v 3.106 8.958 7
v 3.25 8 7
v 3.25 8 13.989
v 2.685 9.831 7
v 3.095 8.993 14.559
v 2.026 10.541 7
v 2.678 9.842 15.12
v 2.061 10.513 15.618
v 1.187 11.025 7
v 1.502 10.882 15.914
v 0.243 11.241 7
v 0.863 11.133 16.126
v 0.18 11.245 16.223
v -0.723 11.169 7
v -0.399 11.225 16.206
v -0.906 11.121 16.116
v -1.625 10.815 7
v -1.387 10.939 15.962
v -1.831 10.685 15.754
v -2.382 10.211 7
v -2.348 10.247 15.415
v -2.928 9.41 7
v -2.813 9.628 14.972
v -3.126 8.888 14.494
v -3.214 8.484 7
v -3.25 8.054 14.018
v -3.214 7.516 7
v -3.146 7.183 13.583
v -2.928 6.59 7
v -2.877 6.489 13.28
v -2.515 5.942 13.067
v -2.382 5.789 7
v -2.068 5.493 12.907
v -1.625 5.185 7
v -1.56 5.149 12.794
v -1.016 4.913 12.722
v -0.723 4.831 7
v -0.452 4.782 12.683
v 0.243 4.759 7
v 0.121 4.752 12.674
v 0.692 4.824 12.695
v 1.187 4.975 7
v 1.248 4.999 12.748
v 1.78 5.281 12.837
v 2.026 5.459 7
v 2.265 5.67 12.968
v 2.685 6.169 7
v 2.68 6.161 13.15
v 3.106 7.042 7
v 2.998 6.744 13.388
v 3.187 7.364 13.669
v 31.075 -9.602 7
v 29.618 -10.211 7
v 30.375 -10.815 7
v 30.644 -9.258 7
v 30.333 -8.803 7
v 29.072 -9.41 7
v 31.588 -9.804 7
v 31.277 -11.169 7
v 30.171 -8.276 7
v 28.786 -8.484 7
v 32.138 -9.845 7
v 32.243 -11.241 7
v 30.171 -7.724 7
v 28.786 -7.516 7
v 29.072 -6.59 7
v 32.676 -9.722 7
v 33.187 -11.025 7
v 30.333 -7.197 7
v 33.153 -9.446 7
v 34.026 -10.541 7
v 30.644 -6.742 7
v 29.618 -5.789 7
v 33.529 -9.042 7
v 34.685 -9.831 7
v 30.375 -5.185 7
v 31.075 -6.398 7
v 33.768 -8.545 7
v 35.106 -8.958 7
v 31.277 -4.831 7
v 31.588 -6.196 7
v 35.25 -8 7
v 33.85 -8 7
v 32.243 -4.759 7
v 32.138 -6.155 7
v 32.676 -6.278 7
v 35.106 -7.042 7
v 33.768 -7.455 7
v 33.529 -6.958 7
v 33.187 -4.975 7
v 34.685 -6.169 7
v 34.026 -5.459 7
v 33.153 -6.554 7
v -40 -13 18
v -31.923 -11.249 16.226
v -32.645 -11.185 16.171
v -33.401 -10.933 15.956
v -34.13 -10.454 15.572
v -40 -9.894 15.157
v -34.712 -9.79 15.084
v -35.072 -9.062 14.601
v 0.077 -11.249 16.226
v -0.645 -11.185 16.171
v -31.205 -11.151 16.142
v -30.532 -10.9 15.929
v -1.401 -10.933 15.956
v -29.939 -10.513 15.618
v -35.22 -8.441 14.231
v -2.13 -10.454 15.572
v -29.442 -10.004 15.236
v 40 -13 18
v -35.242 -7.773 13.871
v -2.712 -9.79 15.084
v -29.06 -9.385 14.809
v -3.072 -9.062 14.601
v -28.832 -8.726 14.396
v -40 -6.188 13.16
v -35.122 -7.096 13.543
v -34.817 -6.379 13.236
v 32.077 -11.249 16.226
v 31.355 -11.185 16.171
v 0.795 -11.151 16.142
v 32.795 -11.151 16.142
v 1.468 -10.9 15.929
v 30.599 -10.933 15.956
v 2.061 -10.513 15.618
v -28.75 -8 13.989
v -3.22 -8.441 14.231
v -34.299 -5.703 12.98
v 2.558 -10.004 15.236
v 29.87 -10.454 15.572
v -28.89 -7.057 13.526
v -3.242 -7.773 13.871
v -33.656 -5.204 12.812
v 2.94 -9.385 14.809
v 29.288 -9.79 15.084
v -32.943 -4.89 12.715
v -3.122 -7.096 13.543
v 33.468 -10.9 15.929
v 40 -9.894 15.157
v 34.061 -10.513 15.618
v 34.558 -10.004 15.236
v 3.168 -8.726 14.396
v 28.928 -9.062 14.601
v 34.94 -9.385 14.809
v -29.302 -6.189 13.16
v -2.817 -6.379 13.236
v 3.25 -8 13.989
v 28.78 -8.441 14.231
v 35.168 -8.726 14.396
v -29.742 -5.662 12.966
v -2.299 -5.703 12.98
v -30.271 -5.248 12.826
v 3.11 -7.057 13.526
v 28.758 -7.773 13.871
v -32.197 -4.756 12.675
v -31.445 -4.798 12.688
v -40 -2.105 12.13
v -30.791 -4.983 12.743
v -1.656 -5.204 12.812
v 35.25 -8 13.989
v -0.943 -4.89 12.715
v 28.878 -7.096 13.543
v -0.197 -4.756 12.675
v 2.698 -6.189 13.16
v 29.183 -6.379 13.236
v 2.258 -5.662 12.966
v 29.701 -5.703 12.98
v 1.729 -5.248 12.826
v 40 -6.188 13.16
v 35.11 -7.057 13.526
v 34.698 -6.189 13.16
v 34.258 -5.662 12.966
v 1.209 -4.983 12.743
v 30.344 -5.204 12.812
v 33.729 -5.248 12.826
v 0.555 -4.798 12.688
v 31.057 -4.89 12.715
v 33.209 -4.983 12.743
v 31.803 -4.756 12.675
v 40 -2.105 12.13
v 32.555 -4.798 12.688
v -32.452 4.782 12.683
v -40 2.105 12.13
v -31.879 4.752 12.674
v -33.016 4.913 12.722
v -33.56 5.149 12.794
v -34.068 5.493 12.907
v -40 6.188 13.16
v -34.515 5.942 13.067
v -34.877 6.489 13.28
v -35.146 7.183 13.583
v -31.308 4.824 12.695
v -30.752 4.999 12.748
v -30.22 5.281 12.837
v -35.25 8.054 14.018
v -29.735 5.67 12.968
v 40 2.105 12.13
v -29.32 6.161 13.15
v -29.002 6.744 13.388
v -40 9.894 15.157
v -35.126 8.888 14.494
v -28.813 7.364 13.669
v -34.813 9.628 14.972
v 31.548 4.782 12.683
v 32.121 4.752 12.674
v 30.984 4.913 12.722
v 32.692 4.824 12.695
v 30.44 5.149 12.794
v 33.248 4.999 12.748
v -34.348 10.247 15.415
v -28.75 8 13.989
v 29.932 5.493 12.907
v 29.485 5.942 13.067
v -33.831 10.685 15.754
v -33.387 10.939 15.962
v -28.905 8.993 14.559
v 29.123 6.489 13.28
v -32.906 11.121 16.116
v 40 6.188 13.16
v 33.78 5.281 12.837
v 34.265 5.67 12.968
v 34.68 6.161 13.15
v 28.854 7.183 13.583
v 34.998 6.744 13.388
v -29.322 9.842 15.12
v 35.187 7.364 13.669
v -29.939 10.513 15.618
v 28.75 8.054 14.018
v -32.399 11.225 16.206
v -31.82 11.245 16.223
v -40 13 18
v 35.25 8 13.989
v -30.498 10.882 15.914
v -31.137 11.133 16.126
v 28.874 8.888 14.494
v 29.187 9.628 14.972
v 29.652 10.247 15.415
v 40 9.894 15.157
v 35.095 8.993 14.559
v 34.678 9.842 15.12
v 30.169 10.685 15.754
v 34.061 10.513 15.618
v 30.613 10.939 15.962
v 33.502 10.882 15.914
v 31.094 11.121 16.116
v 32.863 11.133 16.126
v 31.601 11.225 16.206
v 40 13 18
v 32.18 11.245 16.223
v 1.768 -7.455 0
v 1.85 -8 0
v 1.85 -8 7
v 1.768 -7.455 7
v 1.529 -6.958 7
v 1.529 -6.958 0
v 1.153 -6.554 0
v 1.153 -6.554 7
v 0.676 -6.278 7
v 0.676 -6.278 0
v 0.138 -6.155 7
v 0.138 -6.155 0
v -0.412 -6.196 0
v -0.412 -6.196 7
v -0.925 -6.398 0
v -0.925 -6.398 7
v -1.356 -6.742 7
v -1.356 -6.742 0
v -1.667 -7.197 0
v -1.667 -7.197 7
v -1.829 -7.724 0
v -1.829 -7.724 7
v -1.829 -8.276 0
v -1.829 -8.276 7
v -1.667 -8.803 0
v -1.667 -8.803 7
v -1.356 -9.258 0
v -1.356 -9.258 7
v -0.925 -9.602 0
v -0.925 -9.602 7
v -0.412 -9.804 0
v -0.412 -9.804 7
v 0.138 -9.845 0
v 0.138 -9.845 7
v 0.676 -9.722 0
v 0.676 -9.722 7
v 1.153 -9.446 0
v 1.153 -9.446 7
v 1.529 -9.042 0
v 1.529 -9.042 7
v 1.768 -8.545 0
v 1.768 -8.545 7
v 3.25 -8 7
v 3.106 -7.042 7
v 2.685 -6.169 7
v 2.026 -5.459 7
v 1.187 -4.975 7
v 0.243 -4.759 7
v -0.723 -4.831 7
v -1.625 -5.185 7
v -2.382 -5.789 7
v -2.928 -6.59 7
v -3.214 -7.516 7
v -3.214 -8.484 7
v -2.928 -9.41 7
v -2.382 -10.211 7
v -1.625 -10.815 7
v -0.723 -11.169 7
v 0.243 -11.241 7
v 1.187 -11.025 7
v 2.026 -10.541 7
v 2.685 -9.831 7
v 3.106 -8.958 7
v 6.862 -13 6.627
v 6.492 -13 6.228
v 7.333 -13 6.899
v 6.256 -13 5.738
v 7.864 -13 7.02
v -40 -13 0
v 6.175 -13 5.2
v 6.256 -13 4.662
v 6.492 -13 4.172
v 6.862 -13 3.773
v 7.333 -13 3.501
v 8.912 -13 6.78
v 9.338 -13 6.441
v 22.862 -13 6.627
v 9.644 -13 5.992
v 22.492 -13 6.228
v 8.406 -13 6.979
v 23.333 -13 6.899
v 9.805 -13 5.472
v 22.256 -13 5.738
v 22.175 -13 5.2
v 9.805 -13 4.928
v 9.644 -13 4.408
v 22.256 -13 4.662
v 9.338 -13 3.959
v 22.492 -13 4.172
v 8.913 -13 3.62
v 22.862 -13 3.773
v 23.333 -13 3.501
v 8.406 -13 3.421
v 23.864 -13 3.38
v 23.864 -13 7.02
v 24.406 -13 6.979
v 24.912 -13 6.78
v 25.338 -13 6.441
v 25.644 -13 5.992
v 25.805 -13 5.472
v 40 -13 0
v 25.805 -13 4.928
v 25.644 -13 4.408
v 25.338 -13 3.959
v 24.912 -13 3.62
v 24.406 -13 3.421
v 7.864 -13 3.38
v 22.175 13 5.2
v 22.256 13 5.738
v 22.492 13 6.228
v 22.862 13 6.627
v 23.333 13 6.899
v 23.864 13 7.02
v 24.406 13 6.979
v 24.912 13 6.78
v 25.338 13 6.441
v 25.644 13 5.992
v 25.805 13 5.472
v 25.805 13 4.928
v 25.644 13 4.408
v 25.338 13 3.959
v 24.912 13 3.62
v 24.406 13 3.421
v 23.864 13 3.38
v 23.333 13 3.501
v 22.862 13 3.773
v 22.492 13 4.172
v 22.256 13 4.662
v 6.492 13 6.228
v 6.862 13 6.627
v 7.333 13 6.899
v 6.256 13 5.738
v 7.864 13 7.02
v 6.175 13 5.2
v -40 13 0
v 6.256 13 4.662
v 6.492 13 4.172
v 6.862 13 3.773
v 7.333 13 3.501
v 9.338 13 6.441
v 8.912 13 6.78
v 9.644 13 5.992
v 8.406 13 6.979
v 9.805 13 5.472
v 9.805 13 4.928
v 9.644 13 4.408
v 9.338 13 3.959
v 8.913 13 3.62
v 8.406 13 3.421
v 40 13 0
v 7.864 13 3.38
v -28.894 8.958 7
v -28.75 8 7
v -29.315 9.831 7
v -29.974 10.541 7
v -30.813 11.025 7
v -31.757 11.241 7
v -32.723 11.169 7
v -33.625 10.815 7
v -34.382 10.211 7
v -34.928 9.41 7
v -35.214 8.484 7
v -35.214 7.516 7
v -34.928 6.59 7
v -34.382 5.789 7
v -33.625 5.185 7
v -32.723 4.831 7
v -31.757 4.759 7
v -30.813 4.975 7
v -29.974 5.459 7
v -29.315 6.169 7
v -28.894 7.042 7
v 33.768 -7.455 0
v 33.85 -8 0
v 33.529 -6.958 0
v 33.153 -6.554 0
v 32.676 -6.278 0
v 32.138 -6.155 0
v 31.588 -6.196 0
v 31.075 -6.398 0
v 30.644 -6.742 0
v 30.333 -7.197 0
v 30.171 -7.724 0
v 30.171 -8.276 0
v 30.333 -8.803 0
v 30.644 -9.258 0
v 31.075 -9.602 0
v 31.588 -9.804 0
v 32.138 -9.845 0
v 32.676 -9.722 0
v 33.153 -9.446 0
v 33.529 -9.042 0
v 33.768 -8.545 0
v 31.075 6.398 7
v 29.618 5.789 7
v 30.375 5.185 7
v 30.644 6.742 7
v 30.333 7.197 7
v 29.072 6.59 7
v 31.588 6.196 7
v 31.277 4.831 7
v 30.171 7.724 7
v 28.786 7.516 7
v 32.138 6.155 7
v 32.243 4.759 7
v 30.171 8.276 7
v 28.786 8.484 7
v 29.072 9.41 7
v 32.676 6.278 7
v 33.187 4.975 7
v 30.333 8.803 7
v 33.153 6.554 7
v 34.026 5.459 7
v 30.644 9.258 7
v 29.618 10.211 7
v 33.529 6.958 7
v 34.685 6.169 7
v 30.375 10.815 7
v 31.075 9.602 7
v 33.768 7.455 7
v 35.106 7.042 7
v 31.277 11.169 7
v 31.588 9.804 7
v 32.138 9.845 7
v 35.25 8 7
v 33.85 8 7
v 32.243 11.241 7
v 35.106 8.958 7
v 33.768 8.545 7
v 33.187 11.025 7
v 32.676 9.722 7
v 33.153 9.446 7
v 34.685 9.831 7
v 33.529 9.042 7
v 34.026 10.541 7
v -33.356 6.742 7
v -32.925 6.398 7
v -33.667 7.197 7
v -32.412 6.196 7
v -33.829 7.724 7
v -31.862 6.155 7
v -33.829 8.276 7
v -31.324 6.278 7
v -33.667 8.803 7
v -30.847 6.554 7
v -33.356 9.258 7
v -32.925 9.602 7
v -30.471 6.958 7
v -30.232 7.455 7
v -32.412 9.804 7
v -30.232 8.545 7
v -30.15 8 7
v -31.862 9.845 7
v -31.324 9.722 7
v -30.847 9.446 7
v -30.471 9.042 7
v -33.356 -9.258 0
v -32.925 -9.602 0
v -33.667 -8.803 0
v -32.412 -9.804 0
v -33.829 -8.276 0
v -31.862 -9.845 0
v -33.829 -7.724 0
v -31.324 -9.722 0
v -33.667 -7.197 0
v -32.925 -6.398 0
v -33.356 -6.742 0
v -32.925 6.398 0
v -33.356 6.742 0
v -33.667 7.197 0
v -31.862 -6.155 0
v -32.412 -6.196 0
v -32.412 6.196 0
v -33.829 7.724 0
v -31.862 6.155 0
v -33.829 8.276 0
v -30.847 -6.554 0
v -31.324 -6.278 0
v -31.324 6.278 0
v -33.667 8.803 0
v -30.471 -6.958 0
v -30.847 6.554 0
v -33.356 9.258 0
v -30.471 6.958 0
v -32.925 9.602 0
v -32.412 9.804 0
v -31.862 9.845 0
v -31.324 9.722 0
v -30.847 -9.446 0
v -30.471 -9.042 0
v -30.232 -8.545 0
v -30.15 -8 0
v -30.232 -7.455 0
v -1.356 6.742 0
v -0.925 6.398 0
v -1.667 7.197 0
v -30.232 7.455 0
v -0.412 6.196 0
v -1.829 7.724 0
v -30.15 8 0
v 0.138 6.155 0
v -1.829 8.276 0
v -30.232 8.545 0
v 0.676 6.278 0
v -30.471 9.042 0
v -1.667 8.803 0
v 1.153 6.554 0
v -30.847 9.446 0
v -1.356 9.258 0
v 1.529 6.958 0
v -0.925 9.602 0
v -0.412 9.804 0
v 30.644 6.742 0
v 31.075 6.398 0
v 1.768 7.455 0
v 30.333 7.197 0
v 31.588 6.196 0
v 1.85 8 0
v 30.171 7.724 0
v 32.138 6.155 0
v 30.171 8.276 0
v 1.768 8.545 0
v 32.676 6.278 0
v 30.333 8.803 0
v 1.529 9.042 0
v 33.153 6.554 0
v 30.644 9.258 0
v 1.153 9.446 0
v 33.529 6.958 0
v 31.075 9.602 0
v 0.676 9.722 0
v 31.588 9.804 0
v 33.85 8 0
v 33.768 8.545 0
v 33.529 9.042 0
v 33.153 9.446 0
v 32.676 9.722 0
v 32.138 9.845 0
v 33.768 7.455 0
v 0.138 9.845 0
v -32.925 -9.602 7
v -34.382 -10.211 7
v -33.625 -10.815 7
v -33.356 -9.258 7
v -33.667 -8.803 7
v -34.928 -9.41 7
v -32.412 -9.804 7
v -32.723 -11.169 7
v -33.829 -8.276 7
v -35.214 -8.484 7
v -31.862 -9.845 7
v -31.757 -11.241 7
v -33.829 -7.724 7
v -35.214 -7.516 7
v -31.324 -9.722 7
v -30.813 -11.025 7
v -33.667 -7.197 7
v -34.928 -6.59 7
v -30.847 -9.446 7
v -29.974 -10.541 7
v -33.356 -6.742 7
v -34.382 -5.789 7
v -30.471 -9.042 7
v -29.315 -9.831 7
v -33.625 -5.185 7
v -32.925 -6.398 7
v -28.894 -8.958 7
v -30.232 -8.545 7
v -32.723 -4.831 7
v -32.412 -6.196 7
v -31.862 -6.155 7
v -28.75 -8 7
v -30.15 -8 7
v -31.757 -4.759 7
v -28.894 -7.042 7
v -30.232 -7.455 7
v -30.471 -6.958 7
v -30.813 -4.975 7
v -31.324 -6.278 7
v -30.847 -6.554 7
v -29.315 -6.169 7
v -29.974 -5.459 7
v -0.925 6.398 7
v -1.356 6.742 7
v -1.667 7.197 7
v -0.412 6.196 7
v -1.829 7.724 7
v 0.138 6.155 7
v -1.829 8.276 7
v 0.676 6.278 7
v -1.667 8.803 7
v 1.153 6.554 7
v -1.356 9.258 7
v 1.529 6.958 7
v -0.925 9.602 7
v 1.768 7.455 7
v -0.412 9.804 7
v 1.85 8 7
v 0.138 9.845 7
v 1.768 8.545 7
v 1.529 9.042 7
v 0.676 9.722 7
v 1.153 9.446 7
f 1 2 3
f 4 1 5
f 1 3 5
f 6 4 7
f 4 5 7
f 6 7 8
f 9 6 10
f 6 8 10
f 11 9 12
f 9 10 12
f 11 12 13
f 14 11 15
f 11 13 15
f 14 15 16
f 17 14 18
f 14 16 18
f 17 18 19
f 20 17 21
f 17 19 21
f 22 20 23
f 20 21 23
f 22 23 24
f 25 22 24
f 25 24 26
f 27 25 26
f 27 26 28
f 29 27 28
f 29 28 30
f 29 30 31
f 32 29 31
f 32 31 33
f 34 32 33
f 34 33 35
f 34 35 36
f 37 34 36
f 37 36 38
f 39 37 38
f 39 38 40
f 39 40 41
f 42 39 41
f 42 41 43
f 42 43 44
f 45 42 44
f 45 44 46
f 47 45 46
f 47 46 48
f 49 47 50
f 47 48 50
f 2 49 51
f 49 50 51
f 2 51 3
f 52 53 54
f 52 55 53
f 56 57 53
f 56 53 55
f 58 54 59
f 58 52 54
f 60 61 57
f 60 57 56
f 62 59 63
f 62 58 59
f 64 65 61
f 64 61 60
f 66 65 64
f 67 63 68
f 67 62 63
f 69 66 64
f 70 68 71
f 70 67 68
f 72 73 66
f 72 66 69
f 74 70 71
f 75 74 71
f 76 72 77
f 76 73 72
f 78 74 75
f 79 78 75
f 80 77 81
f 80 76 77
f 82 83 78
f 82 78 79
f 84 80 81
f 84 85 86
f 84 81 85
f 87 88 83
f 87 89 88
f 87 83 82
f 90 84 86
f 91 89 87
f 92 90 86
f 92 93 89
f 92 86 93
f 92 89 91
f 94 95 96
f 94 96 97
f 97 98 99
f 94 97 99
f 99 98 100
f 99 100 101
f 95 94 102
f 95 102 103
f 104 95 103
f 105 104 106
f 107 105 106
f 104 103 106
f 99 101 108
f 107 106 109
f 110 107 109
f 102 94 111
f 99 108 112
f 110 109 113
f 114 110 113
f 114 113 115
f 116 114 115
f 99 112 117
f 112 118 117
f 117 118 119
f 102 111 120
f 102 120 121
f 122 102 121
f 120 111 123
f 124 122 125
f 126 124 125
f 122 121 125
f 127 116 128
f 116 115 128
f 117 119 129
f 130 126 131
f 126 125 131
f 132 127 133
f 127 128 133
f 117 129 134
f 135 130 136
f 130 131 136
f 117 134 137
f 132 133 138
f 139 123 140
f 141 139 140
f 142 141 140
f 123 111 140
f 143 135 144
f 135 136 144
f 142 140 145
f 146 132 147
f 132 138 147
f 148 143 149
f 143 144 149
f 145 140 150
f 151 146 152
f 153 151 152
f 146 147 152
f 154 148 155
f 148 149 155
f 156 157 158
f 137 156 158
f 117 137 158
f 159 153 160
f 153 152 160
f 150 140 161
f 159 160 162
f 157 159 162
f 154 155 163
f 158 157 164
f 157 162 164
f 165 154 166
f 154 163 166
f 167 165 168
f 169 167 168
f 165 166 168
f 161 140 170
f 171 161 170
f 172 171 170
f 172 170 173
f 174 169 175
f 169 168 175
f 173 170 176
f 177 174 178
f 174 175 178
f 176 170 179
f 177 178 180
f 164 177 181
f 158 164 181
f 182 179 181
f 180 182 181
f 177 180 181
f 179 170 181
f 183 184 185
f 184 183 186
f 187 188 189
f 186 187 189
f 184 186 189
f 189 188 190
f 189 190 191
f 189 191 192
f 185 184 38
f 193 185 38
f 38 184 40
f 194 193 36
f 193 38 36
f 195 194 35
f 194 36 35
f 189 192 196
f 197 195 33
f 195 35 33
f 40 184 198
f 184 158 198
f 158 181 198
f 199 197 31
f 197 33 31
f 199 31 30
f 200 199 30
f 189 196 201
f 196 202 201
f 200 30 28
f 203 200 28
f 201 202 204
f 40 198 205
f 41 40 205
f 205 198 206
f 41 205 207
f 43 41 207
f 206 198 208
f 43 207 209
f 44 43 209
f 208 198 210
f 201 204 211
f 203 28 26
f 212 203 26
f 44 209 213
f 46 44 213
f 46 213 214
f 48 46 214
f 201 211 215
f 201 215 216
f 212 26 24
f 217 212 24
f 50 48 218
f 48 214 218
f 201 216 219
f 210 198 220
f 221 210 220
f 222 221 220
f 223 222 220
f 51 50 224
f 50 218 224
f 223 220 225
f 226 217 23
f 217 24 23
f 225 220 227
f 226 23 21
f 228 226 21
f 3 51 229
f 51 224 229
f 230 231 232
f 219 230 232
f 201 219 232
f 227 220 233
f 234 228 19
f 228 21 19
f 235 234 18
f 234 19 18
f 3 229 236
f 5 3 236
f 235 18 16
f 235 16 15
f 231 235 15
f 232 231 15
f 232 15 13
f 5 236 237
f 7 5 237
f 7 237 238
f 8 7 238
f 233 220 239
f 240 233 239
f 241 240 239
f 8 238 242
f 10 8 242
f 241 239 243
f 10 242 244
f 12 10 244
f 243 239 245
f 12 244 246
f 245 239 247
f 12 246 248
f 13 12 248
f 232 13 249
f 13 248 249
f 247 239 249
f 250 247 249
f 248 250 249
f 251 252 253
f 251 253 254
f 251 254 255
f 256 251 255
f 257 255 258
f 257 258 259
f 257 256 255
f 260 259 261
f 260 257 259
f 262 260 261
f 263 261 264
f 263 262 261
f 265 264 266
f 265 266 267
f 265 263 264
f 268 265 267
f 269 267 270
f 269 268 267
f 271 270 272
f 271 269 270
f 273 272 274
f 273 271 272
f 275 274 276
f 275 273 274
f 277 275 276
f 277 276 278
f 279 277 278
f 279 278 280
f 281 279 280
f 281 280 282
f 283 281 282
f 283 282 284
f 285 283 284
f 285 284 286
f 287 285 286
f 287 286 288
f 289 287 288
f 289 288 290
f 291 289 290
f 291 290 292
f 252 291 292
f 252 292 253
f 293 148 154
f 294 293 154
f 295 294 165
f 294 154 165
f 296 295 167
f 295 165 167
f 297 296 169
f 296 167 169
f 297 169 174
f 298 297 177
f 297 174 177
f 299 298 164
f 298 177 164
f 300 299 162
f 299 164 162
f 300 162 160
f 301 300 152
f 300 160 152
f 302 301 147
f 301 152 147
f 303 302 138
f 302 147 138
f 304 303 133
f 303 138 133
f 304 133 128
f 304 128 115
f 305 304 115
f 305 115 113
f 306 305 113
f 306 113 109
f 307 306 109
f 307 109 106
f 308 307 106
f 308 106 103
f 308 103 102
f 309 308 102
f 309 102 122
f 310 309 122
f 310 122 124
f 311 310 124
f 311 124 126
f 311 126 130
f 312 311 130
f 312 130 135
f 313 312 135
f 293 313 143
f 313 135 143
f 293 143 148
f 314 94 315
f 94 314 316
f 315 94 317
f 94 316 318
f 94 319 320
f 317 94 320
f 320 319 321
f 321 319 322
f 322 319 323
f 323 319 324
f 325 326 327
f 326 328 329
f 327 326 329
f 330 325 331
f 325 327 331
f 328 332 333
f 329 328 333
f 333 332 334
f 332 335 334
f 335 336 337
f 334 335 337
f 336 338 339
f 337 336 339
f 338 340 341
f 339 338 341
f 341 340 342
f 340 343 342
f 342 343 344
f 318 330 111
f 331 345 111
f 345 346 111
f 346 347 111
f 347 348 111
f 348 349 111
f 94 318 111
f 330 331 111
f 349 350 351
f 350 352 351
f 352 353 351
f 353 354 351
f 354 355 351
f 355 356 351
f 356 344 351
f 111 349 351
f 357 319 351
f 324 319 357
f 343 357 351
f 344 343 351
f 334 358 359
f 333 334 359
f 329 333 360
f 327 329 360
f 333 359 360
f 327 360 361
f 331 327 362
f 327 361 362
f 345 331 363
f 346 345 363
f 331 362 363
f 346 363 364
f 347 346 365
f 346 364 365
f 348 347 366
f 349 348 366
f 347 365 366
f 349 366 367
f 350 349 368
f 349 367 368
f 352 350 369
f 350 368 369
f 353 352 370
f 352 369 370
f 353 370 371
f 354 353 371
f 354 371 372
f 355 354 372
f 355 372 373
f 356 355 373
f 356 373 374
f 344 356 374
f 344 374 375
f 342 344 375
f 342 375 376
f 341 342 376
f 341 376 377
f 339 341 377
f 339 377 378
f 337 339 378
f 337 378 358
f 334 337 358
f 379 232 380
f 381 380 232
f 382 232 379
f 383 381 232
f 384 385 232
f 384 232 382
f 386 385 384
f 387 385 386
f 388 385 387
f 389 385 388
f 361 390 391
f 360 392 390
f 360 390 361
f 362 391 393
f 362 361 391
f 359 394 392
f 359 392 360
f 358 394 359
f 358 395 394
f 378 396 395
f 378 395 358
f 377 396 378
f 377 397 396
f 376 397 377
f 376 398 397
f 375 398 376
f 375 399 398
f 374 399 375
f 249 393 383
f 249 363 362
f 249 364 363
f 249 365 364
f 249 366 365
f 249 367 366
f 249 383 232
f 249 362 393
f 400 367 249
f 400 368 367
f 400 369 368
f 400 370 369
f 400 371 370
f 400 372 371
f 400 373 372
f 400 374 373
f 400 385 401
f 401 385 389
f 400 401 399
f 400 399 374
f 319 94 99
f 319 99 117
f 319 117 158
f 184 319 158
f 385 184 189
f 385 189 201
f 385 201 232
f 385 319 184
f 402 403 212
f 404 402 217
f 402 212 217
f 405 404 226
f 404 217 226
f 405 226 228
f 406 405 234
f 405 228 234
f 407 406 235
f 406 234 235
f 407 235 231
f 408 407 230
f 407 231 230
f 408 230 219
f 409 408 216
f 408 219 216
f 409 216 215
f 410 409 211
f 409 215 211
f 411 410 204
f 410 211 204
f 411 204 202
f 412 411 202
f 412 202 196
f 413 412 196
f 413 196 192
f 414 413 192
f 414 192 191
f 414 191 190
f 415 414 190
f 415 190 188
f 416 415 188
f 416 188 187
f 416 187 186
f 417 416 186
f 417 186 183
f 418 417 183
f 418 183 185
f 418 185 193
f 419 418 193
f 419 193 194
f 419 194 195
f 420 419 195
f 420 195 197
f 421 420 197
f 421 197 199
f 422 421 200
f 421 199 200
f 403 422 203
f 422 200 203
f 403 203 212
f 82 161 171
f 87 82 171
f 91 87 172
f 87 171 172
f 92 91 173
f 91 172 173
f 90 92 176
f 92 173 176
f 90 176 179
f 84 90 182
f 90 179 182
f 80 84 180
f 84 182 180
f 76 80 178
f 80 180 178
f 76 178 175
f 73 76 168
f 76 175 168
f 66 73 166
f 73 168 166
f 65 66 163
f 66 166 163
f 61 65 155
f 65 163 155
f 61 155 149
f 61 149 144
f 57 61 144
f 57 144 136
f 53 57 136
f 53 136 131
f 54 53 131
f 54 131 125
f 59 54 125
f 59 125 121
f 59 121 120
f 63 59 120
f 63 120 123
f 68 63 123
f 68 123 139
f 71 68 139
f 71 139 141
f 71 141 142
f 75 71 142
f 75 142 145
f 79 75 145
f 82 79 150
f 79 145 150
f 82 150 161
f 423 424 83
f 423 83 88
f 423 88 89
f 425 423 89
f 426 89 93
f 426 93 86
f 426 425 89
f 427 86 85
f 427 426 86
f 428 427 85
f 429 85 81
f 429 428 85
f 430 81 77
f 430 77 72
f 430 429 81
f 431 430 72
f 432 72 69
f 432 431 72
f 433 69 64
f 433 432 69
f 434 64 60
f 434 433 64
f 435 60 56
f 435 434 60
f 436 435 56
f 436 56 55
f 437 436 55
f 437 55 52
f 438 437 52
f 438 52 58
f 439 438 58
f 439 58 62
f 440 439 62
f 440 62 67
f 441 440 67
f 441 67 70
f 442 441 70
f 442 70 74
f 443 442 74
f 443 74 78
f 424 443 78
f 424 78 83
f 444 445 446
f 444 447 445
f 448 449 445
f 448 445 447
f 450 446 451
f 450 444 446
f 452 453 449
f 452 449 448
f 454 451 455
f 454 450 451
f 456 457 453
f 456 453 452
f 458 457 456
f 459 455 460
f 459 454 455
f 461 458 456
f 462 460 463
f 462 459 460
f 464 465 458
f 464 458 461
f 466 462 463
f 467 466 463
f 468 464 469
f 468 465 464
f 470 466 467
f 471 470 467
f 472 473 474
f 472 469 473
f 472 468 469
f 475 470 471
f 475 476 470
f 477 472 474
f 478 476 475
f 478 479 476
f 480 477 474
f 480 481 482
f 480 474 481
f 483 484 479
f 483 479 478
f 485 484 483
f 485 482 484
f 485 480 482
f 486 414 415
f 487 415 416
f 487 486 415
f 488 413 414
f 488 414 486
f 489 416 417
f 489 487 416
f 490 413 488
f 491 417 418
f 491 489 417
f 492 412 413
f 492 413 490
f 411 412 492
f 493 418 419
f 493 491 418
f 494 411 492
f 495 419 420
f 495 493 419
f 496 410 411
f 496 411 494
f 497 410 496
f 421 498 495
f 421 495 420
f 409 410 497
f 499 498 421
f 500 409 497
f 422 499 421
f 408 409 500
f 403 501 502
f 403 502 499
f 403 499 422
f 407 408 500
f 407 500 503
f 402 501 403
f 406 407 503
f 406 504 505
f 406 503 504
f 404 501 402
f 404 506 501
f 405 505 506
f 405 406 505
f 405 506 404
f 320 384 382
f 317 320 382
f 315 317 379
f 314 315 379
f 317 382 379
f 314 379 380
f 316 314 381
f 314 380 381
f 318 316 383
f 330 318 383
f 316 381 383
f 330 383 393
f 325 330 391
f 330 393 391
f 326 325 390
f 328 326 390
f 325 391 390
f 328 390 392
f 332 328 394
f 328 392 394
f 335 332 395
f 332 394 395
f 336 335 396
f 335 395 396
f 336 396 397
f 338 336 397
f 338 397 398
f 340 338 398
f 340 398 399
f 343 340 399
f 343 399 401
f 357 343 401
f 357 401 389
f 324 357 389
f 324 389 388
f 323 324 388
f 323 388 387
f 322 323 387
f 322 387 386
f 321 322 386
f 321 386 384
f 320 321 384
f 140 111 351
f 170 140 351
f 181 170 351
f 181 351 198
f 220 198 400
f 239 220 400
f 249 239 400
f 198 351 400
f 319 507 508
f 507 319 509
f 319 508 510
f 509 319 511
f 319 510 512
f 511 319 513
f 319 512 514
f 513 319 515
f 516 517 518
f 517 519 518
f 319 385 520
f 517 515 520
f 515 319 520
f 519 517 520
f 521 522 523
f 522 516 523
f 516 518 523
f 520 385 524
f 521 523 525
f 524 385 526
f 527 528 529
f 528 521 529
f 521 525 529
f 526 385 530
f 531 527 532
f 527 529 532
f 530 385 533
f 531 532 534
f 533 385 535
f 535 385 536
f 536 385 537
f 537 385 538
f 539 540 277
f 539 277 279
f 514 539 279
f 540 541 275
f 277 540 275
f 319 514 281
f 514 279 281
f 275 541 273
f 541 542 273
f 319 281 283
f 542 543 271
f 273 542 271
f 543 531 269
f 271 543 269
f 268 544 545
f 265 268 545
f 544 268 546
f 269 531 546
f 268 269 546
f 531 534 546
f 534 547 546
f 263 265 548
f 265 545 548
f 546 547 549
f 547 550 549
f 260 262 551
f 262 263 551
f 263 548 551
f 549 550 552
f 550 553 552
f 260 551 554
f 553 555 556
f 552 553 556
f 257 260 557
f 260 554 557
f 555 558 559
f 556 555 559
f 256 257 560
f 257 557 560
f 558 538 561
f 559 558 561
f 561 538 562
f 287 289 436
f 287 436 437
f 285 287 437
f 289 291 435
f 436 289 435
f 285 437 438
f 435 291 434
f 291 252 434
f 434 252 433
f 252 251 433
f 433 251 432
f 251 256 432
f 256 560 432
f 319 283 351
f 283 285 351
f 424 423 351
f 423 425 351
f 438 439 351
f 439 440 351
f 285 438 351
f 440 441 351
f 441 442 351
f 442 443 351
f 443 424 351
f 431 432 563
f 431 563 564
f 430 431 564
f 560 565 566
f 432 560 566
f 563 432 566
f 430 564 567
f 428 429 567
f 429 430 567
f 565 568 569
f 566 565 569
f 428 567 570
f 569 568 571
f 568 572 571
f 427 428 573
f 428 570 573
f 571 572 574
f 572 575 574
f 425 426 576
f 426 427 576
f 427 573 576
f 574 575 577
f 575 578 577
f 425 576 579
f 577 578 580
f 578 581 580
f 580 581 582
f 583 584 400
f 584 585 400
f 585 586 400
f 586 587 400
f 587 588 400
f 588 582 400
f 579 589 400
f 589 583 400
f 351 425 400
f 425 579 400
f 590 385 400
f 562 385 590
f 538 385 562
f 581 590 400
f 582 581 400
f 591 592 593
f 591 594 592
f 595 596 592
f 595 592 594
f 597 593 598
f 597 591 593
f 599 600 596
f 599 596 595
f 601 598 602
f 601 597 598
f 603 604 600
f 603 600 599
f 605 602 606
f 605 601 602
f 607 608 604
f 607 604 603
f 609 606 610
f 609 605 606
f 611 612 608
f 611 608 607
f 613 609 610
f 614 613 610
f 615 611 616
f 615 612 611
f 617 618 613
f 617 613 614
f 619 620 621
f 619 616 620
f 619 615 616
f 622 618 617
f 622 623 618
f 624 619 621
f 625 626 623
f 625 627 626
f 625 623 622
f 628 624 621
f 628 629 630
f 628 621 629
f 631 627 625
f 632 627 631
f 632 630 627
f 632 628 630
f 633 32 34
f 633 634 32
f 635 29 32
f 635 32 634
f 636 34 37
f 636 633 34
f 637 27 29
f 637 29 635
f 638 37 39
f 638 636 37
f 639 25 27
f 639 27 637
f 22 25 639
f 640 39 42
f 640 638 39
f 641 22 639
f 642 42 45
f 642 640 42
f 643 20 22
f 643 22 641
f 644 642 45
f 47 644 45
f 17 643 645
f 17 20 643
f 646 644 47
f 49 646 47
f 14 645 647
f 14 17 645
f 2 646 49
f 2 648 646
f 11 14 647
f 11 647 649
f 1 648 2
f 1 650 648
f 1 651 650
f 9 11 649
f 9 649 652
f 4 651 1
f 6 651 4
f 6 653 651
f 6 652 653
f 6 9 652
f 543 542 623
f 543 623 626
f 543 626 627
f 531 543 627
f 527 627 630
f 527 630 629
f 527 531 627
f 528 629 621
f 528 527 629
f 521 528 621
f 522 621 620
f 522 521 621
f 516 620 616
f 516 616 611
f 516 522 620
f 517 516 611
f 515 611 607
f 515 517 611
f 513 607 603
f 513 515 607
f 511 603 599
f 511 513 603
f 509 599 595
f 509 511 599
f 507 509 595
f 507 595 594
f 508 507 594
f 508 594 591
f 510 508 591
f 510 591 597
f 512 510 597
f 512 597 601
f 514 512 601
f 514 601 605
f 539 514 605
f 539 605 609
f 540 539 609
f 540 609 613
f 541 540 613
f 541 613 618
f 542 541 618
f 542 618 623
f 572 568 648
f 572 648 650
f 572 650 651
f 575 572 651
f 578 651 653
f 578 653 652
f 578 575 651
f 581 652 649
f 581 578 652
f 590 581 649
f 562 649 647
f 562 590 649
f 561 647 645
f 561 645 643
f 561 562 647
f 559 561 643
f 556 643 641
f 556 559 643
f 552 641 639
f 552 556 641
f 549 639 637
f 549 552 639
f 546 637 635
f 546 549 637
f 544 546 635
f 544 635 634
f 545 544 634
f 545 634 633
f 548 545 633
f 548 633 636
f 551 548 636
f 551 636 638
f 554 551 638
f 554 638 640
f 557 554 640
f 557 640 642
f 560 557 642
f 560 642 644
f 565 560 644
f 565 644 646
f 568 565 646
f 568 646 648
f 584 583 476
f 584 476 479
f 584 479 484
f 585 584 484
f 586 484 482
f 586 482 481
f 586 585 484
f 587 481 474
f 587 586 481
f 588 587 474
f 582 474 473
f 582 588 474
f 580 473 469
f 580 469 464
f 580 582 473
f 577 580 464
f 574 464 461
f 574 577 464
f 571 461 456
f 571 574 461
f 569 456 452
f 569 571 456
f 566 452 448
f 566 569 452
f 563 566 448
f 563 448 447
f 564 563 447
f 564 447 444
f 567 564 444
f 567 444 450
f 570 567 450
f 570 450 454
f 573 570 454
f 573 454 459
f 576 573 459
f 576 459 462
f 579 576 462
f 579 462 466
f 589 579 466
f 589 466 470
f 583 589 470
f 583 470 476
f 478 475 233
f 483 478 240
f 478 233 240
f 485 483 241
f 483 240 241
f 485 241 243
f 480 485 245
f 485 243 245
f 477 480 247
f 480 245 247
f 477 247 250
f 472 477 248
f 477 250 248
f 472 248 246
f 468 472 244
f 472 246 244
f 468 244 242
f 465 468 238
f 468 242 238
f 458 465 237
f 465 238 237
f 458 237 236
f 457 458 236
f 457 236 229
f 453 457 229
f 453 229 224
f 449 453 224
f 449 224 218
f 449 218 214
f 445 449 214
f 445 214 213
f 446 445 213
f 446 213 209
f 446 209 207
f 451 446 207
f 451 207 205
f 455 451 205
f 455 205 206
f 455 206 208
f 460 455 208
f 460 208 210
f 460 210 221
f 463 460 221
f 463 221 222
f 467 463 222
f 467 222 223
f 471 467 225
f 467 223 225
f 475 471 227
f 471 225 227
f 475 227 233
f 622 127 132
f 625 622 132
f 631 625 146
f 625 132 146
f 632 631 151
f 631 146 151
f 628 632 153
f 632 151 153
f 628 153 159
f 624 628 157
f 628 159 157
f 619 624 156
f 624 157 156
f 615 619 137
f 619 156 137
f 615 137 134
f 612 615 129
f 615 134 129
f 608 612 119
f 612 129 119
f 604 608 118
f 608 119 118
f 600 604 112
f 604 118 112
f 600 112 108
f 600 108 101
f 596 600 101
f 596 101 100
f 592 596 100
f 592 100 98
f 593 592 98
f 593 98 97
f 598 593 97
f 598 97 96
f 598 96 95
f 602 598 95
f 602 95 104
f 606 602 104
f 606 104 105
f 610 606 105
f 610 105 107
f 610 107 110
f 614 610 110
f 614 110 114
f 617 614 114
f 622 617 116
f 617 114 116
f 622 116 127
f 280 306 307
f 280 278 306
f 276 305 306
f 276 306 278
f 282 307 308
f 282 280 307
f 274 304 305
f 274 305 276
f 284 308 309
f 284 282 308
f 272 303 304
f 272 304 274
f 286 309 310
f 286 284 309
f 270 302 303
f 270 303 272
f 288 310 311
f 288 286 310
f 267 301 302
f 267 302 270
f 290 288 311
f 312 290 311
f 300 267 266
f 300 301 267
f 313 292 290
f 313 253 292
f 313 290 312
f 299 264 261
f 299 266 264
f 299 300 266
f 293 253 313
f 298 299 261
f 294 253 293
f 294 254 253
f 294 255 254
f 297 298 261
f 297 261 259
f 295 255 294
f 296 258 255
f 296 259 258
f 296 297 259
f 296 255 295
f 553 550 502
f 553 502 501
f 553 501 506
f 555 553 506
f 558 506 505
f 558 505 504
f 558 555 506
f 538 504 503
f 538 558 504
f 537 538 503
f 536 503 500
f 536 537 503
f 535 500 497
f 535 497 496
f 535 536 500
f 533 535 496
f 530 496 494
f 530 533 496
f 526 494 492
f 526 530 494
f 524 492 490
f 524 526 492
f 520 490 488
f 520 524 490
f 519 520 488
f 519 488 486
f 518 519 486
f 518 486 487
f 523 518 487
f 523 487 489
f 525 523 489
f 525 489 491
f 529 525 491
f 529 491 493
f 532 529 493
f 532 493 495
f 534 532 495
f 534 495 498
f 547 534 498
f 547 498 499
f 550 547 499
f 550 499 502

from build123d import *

# Parameters (mm, degrees)
F0_W     = 80
F0_H     = 26
F0_R     = 1.85
F1_DEPTH = 25
F3_R     = 3.25
F3_R_2   = 1.85
F4_DEPTH = 18
F5_DEPTH = 100
F6_R     = 1.825
F7_DEPTH = 90


with BuildPart() as f1:
    # F0 (on Top) → F1 (new body)
    with BuildSketch(Plane.XY):
        Rectangle(F0_W, F0_H)
        with Locations((-32, -8)):
            Circle(F0_R, mode=Mode.SUBTRACT)
        with Locations((0, -8)):
            Circle(F0_R, mode=Mode.SUBTRACT)
        with Locations((32, -8)):
            Circle(F0_R, mode=Mode.SUBTRACT)
        with Locations((-32, 8)):
            Circle(F0_R, mode=Mode.SUBTRACT)
        with Locations((0, 8)):
            Circle(F0_R, mode=Mode.SUBTRACT)
        with Locations((32, 8)):
            Circle(F0_R, mode=Mode.SUBTRACT)
    extrude(amount=F1_DEPTH)

    # F3 (on face) → F4 (cut)
    with BuildSketch(Plane.XY.offset(25)):
        with Locations((-32, -8)):
            Circle(F3_R)
        with Locations((-32, -8)):
            Circle(F3_R_2, mode=Mode.SUBTRACT)
        with Locations((-32, 8)):
            Circle(F3_R)
        with Locations((-32, 8)):
            Circle(F3_R_2, mode=Mode.SUBTRACT)
        with Locations((0, 8)):
            Circle(F3_R)
        with Locations((0, 8)):
            Circle(F3_R_2, mode=Mode.SUBTRACT)
        with Locations((0, -8)):
            Circle(F3_R)
        with Locations((0, -8)):
            Circle(F3_R_2, mode=Mode.SUBTRACT)
        with Locations((32, 8)):
            Circle(F3_R)
        with Locations((32, 8)):
            Circle(F3_R_2, mode=Mode.SUBTRACT)
        with Locations((32, -8)):
            Circle(F3_R)
        with Locations((32, -8)):
            Circle(F3_R_2, mode=Mode.SUBTRACT)
    extrude(amount=-F4_DEPTH, mode=Mode.SUBTRACT)

    # F2 (on face) → F5 (cut)
    with BuildSketch(Plane.YZ.offset(40)):
        with BuildLine():
            Line((-13, 25), (-13, 18))
            ThreePointArc((-13, 18), (0, 12), (13, 18))
            Line((13, 18), (13, 25))
            Line((13, 25), (-13, 25))
        make_face()
    extrude(amount=-F5_DEPTH, mode=Mode.SUBTRACT)

    # F6 (on face) → F7 (cut)
    with BuildSketch(Plane(origin=(0, 13, 0), x_dir=(-1, 0, 0), z_dir=(0, 1, 0))):
        with Locations((-24, 5.2)):
            Circle(F6_R)
        with Locations((-8, 5.2)):
            Circle(F6_R)
    extrude(amount=-F7_DEPTH, mode=Mode.SUBTRACT)


solid = f1.part
